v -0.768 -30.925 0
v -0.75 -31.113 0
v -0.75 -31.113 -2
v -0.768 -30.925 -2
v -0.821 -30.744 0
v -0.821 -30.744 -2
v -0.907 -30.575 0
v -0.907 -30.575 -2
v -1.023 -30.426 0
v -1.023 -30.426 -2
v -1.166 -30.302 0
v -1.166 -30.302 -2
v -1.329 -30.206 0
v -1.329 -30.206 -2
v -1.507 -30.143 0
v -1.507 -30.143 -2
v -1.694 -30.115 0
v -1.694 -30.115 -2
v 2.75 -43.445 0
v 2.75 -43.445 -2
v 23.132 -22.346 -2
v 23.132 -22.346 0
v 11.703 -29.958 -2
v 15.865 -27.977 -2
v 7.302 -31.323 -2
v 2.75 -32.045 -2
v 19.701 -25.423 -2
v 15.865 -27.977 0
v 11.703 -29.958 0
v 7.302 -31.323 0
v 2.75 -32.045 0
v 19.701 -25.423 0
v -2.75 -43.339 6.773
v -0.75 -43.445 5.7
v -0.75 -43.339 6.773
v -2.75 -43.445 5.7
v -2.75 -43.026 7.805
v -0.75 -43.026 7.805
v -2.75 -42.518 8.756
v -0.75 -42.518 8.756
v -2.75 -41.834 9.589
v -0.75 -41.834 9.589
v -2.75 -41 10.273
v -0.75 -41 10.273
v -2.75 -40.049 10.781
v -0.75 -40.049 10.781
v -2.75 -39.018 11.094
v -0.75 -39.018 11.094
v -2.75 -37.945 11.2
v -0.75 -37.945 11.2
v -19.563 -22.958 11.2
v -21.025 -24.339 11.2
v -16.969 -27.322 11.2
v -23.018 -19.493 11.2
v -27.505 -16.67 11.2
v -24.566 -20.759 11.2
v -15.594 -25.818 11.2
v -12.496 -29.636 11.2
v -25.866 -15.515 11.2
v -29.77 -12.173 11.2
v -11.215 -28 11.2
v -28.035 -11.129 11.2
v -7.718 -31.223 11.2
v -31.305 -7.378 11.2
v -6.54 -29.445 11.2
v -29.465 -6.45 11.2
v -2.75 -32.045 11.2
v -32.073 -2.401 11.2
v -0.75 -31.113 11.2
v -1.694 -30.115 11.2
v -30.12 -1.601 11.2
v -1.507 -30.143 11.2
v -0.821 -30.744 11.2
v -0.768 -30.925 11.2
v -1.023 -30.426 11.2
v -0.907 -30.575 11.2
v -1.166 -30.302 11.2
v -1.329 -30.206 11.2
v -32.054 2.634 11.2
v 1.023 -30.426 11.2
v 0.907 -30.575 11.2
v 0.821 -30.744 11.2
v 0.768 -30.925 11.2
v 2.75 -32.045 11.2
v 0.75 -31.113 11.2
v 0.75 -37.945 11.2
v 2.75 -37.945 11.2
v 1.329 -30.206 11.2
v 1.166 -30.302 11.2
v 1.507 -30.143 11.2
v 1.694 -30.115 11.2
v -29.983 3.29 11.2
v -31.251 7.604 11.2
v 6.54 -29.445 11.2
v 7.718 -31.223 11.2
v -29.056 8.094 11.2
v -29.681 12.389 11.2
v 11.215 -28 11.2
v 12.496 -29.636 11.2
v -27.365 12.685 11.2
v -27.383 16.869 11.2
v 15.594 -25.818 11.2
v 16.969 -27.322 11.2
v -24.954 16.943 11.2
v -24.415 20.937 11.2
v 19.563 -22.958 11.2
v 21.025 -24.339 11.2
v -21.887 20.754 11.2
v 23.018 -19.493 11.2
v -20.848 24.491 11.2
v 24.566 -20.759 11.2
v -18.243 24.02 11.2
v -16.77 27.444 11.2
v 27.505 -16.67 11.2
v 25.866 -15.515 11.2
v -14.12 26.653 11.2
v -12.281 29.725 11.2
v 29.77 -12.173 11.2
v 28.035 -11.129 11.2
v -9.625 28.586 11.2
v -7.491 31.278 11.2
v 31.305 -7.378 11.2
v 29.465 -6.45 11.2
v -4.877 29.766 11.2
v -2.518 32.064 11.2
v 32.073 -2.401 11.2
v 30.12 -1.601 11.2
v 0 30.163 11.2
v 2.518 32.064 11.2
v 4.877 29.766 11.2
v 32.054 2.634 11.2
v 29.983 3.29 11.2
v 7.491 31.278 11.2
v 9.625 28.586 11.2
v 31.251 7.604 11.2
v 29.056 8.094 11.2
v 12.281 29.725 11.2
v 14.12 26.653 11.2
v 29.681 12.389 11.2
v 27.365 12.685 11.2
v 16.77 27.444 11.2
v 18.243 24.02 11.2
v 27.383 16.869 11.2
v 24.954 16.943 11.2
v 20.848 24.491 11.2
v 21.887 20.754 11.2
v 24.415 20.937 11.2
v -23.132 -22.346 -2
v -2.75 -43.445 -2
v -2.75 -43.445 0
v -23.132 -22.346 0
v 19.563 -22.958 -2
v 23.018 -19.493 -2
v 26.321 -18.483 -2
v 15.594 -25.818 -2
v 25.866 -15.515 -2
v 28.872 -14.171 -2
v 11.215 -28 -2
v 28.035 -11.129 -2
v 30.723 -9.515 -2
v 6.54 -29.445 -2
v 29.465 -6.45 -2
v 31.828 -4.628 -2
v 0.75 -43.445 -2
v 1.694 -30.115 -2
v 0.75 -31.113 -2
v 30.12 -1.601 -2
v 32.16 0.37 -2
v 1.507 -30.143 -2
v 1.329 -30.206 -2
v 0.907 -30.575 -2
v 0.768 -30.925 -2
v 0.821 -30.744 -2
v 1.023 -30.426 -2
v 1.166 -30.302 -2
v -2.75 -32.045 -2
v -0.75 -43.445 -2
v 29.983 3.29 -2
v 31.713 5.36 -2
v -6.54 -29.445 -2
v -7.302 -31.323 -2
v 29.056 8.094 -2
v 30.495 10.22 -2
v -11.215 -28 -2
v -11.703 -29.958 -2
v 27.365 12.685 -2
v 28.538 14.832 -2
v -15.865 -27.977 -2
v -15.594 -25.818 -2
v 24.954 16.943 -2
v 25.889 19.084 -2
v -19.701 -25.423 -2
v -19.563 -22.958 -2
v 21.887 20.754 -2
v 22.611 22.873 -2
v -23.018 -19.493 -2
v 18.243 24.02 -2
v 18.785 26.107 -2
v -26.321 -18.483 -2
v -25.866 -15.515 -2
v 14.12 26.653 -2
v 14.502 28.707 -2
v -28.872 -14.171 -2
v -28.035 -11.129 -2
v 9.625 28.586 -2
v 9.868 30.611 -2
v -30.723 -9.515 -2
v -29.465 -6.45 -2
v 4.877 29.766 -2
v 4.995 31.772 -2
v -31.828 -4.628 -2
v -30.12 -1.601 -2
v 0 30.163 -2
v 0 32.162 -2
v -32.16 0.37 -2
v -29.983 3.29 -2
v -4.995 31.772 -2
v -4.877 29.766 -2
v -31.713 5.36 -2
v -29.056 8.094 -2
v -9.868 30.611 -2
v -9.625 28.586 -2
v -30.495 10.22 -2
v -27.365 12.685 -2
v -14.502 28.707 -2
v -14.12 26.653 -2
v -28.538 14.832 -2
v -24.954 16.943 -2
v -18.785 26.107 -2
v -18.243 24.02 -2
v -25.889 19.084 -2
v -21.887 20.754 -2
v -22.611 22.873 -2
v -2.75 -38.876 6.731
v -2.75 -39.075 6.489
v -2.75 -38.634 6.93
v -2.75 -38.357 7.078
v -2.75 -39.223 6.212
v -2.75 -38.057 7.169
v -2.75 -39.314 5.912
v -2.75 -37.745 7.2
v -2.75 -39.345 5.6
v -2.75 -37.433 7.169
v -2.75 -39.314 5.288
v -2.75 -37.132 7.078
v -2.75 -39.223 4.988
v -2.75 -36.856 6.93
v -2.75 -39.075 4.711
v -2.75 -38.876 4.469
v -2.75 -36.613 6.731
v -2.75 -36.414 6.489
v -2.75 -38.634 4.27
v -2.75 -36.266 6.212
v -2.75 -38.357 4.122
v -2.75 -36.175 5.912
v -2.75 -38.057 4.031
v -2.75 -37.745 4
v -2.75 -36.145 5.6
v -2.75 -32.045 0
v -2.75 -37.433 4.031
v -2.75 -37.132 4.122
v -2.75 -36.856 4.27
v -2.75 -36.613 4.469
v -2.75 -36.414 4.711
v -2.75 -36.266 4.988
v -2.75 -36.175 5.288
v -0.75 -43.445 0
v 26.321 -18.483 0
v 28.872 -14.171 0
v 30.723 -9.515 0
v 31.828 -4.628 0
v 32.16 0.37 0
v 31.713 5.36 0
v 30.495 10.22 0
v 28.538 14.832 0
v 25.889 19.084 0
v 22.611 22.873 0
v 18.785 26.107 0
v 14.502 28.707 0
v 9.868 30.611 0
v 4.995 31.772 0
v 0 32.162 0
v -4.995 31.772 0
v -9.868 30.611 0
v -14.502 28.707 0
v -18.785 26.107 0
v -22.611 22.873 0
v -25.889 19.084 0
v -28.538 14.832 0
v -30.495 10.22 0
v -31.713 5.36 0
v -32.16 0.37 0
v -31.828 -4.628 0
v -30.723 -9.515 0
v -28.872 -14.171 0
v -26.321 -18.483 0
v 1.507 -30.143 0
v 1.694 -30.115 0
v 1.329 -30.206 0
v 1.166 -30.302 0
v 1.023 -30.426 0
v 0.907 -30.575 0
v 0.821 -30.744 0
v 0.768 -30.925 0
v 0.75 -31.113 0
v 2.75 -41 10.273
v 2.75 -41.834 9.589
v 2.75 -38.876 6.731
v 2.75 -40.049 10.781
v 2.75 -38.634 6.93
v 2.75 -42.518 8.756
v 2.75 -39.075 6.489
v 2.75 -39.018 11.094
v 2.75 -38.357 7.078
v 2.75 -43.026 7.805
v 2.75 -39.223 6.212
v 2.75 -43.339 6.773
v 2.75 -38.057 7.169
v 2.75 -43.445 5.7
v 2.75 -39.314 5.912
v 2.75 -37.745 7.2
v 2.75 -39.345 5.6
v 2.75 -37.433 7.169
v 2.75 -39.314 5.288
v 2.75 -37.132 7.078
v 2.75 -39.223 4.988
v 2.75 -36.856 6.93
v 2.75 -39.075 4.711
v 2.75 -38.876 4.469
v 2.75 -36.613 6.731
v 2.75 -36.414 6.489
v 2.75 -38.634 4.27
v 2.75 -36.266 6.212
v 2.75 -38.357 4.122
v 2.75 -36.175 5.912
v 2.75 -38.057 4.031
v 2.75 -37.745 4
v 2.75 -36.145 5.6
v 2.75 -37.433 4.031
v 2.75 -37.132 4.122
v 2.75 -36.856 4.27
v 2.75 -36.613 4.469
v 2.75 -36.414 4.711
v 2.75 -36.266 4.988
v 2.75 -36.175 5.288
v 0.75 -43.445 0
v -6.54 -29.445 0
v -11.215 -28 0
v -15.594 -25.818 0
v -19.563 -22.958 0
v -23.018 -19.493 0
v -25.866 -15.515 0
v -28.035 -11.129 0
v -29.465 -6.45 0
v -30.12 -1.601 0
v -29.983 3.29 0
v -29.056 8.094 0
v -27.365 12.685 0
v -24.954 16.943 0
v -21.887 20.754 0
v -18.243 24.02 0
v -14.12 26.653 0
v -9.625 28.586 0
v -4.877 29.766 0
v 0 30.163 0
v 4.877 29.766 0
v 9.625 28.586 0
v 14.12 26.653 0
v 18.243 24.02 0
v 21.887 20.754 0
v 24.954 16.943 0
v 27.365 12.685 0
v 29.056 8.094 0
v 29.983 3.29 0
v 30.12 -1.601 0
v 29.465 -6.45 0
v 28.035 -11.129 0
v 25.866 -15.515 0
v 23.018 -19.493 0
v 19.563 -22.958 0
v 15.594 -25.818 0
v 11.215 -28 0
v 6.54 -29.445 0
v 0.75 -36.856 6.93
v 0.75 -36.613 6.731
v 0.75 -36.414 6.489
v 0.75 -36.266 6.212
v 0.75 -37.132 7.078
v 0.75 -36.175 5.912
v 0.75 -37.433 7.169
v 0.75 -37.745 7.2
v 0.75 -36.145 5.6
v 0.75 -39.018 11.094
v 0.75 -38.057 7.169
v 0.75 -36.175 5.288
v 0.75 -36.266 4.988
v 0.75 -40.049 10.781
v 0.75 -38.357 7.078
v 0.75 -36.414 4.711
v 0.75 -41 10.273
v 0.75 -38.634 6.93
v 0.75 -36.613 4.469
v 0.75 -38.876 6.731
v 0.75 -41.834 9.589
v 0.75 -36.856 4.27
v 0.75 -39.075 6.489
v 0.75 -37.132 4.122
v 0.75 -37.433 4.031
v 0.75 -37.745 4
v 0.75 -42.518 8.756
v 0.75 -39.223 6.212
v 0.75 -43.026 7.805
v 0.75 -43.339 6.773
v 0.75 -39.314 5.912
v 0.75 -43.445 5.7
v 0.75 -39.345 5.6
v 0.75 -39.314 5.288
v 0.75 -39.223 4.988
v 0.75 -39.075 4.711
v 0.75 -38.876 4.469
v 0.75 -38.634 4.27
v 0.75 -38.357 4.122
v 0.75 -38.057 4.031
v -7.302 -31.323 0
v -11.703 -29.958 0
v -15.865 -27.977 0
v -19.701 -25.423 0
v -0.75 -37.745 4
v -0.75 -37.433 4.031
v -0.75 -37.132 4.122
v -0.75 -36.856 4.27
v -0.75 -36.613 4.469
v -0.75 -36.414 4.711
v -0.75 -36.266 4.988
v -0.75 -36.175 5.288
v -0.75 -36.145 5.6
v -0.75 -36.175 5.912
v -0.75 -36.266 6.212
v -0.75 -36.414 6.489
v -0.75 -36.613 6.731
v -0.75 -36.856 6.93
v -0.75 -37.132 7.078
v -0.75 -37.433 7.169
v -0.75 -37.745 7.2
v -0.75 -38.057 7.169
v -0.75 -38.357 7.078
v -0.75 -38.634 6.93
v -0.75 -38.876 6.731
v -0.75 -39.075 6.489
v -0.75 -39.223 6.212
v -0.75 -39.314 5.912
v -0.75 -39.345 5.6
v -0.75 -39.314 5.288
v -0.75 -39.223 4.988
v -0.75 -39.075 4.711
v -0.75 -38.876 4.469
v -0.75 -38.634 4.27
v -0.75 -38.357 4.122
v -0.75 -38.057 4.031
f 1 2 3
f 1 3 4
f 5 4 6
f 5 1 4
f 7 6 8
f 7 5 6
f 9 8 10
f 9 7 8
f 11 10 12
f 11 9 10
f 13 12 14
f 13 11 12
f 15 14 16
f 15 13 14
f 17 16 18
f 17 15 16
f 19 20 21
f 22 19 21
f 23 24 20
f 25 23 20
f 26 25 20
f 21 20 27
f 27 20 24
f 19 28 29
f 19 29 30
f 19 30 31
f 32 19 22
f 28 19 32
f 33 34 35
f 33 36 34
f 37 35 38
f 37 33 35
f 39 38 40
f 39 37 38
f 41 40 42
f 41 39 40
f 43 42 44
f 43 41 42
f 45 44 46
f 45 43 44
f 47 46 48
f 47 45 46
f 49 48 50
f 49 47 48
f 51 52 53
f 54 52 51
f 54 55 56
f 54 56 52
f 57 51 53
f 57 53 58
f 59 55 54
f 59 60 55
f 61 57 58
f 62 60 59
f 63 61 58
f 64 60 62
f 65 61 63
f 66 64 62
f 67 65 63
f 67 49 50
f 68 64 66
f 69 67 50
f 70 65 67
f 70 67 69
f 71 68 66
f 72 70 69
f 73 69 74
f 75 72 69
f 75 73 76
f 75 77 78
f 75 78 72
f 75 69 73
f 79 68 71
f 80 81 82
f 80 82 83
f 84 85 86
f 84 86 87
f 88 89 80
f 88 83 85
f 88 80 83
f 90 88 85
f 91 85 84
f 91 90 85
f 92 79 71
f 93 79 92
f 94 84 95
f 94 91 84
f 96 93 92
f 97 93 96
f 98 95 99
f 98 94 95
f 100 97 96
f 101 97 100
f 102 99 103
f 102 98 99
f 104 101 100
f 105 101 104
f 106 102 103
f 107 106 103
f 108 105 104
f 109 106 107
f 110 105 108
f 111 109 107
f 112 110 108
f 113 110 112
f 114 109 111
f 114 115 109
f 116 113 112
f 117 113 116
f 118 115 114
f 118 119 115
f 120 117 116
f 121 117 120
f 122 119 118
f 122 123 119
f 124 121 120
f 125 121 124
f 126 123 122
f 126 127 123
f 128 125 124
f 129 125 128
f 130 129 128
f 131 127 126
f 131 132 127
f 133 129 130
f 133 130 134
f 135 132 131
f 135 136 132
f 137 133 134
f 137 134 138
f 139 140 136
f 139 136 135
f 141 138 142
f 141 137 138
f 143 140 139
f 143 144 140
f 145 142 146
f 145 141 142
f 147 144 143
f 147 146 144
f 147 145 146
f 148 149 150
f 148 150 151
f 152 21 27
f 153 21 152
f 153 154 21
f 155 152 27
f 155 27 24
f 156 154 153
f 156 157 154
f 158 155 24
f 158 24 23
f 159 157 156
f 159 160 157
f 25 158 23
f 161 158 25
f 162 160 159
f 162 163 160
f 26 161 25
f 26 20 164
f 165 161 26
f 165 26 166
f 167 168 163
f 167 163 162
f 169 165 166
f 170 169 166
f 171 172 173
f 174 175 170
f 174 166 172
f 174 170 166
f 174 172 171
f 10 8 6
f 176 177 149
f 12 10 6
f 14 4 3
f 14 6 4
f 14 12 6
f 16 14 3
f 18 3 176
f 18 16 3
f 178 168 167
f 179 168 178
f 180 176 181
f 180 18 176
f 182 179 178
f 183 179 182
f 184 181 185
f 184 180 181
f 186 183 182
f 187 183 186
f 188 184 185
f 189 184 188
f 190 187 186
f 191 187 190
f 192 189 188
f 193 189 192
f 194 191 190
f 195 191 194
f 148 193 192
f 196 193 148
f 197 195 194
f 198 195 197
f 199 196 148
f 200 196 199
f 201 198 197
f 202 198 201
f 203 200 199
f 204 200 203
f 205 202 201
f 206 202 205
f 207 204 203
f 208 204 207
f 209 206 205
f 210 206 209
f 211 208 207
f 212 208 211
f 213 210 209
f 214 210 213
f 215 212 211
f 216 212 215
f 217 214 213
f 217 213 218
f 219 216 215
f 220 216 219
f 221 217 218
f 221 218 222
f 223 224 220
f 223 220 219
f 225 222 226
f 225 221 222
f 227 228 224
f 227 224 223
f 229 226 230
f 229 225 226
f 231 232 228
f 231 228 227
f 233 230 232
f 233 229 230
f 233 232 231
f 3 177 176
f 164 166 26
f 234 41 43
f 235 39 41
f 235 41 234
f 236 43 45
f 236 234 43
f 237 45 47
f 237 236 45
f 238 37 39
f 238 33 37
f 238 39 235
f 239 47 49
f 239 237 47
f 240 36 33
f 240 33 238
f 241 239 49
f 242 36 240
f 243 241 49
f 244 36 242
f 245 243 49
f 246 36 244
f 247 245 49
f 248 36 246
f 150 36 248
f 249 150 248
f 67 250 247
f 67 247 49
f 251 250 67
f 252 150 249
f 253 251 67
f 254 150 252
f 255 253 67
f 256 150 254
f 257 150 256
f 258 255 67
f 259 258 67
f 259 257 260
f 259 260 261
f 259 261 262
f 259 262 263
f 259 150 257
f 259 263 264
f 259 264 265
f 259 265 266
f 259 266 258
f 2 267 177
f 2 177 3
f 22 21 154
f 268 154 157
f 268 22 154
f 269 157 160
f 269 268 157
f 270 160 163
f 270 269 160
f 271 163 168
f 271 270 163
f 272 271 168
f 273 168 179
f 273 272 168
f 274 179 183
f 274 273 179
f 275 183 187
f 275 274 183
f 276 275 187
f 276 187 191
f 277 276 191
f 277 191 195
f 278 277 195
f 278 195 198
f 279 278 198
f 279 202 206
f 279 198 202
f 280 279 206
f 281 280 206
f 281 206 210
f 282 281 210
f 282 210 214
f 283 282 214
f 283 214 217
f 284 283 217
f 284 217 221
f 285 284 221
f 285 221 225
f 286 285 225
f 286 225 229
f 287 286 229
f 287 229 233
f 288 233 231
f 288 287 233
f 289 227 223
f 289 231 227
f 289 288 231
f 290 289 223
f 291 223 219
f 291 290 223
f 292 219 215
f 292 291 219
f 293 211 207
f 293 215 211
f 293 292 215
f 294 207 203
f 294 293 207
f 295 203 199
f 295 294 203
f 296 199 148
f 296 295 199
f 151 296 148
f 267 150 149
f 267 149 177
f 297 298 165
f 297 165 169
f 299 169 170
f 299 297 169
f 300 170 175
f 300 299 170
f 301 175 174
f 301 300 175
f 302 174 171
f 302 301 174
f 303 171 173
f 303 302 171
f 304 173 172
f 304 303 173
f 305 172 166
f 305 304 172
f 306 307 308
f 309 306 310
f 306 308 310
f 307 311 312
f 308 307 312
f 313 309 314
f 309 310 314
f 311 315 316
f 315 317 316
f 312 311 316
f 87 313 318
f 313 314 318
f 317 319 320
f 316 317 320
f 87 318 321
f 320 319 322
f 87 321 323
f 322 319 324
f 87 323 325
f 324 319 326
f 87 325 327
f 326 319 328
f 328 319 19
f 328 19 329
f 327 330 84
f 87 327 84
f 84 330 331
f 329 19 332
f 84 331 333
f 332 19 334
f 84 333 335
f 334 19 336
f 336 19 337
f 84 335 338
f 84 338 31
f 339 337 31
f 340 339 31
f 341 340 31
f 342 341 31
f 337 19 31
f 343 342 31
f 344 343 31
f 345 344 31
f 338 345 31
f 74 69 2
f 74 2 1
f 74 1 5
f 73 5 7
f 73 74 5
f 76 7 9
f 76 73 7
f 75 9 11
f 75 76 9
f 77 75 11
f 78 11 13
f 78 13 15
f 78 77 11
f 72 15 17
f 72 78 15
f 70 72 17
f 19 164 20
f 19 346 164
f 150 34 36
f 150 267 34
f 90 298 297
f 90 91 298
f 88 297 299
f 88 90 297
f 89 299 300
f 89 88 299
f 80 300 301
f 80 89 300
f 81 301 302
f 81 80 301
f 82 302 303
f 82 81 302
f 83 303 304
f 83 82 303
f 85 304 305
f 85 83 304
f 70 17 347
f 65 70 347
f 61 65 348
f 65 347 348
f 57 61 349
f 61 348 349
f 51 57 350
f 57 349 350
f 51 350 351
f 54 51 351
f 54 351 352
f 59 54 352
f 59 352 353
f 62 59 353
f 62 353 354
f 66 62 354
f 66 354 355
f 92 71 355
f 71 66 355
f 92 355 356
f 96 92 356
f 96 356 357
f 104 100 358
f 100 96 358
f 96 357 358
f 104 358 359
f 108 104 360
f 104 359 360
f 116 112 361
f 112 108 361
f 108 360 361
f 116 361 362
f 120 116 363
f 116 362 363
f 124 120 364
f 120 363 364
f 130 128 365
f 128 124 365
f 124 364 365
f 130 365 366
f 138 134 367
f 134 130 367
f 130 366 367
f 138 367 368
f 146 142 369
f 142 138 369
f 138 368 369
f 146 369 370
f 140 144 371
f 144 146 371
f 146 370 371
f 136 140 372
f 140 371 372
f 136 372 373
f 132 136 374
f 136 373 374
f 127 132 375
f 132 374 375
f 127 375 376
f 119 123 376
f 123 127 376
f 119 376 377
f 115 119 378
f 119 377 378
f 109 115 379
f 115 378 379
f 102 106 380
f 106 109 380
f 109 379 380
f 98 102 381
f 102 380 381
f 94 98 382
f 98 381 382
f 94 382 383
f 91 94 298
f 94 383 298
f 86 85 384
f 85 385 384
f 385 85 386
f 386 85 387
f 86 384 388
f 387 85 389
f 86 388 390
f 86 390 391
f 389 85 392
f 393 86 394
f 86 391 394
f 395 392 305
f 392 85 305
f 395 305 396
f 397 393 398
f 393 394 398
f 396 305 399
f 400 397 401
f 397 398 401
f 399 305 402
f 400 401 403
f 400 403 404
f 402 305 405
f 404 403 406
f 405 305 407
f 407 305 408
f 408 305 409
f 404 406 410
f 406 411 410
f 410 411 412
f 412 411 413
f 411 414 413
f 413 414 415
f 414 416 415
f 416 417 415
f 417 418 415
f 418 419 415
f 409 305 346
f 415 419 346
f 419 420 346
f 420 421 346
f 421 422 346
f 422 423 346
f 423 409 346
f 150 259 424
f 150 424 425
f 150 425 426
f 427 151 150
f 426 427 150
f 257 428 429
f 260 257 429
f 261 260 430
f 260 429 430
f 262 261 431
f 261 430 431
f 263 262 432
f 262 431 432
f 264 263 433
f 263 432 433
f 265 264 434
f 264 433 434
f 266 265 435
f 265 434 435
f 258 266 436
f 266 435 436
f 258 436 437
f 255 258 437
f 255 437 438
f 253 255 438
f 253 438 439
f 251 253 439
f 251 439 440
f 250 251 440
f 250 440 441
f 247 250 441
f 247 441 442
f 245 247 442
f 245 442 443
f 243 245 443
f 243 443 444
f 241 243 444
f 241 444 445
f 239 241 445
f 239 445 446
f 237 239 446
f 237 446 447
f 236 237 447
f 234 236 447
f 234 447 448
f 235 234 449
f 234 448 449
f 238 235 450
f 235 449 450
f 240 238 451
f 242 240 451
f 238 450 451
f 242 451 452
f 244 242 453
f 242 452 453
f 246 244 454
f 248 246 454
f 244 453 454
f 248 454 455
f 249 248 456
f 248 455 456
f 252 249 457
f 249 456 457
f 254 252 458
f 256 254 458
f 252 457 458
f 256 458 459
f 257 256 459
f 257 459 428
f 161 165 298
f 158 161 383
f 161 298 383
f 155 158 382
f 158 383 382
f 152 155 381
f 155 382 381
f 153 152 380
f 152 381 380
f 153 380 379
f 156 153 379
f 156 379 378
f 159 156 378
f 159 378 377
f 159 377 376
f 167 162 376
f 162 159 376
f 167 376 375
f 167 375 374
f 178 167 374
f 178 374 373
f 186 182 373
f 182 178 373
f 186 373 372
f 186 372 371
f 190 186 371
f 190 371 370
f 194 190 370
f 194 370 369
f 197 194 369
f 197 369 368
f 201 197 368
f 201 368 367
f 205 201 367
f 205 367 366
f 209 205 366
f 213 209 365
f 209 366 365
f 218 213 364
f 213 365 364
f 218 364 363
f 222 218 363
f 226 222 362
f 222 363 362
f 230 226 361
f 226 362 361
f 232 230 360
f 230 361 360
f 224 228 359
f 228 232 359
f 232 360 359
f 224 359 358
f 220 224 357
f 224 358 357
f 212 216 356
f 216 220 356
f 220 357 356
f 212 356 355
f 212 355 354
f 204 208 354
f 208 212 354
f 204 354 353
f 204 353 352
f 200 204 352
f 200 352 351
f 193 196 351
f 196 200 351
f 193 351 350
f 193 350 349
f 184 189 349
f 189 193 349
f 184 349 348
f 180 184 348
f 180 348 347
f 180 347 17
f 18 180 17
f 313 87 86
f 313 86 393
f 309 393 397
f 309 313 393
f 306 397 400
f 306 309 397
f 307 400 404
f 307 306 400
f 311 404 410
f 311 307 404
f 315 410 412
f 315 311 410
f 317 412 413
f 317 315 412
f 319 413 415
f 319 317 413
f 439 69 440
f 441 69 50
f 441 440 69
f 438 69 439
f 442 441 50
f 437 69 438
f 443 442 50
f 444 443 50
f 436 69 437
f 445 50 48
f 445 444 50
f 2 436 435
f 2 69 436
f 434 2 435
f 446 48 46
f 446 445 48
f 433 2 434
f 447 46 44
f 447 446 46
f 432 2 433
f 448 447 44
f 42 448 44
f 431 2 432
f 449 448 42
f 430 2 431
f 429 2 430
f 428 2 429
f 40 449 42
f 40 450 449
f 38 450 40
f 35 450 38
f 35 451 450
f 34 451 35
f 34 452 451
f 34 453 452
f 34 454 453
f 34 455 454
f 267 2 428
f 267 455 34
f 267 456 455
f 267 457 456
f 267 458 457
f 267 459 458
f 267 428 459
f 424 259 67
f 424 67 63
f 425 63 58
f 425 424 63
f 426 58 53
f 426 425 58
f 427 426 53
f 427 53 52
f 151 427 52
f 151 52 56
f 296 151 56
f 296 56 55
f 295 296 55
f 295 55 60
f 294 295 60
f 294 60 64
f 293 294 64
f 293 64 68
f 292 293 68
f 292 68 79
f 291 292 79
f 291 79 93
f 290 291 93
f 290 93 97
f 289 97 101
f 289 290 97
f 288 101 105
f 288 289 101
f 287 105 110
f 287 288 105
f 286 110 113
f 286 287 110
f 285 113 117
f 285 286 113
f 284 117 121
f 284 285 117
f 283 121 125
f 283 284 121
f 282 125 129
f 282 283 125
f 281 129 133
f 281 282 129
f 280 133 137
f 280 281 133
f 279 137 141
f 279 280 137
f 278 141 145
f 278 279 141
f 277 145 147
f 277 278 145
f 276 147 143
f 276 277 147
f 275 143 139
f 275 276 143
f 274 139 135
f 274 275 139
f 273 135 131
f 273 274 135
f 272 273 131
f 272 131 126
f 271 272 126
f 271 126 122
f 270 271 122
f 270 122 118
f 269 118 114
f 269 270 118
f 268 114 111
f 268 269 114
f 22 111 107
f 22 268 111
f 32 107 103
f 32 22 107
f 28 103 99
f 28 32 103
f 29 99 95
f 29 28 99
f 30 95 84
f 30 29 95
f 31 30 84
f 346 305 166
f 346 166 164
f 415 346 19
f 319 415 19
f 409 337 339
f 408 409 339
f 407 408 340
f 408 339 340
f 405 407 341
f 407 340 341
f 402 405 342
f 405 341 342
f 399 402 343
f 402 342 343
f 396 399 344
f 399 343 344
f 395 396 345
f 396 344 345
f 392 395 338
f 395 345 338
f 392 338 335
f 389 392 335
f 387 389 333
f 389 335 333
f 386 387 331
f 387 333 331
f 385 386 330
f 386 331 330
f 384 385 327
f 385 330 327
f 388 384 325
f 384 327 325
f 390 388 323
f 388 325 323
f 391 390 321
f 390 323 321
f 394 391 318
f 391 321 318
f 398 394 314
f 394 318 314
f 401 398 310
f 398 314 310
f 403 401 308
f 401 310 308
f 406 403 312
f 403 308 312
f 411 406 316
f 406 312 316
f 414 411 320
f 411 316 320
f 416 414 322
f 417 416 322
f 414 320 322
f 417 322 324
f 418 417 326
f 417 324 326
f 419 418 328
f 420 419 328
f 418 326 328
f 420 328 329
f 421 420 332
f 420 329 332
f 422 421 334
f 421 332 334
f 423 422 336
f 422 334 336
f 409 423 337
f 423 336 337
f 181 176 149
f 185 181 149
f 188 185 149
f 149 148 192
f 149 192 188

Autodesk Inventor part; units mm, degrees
ref_plane "YZ Plane" through (0, 0, 0) normal (1, 0, 0) x (0, 1, 0)
ref_plane "XZ Plane" through (0, 0, 0) normal (0, 1, 0) x (-1, 0, 0)
ref_plane "XY Plane" through (0, 0, 0) normal (0, 0, 1) x (1, 0, 0)
sketch "Sketch1" plane through (0, 0, 0) normal (0, 0, 1) x (1, 0, 0)
  arc A0 (0.75, -30.1532) -> (-0.75, -30.1532) centre (0, 0) ccw
  arc A1 (2.75, -32.0447) -> (-2.75, -32.0447) centre (0, 0) ccw
  line L0 (-0.75, -30.1532) -> (-0.75, -43.4447)
  line L1 (-0.75, -43.4447) -> (-2.75, -43.4447)
  line L2 (-2.75, -43.4447) -> (-2.75, -32.0447)
  line L3 (0.75, -30.1532) -> (0.75, -43.4447)
  line L4 (0.75, -43.4447) -> (2.75, -43.4447)
  line L5 (2.75, -43.4447) -> (2.75, -32.0447)
  dimension "d0" = 60.325
  dimension "d2" = 2
  dimension "d3" = 2
  dimension "d4" = 1.5
  dimension "d5" = 11.4
extrude "Extrusion1" add sketch "Sketch1" along normal blind 11.2
sketch "Sketch2" plane through (2.75, -43.4447, 0) normal (1, 0, 0) x (0, 0, -1)
  line L0 (0, 11.4) -> (-11.2, 11.4) projected
  line L1 (-11.2, 0) -> (-11.2, 11.4) projected
  circle A0 centre (-5.6, 5.7) radius 1.6
  point P0 (0, 43.4447)
  point P1 (-5.6, 11.4)
  point P2 (-11.2, 5.7)
  dimension "d8" = 3.2
extrude "Extrusion2" cut sketch "Sketch2" against normal through all
sketch "Sketch3" plane through (0, 0, 0) normal (0, 0, -1) x (-1, 0, 0)
  arc A0 (0.75, -30.1532) -> (-0.75, -30.1532) centre (0, 0) ccw projected
  line L0 (0.75, -43.4447) -> (0.75, -30.1532) projected
  line L1 (2.75, -43.4447) -> (0.75, -43.4447) projected
  line L2 (2.75, -32.0447) -> (2.75, -43.4447) projected
  arc A1 (2.75, -32.0447) -> (-2.75, -32.0447) centre (0, 0) ccw projected
  line L3 (-2.75, -43.4447) -> (-2.75, -32.0447) projected
  line L4 (-0.75, -43.4447) -> (-2.75, -43.4447) projected
  line L5 (-0.75, -30.1532) -> (-0.75, -43.4447) projected
extrude "Extrusion3" add sketch "Sketch3" along normal blind 2
sketch "Sketch4" plane through (0, 0, -2) normal (0, 0, -1) x (-1, 0, 0)
  line L0 (2.75, -43.4447) -> (2.75, -32.0447) projected
  arc A0 (2.75, -32.0447) -> (-2.75, -32.0447) centre (0, 0) ccw projected
  line L1 (-2.75, -32.0447) -> (-2.75, -43.4447) projected
  line L2 (2.75, -43.4447) -> (23.1319, -22.346)
  line L3 (-2.75, -43.4447) -> (-23.1319, -22.346)
extrude "Extrusion4" add sketch "Sketch4" against normal blind 2
fillet "Fillet1" radius 5.5 2 edges at (1.75, -43.4447, 11.2) (-1.75, -43.4447, 11.2)
fillet "Fillet2" radius 1 4 edges at (-0.75, -30.1532, 5.6) (-0.75, -30.1532, -1) (0.75, -30.1532, 5.6) (0.75, -30.1532, -1)
properties part number "CLAMP"
